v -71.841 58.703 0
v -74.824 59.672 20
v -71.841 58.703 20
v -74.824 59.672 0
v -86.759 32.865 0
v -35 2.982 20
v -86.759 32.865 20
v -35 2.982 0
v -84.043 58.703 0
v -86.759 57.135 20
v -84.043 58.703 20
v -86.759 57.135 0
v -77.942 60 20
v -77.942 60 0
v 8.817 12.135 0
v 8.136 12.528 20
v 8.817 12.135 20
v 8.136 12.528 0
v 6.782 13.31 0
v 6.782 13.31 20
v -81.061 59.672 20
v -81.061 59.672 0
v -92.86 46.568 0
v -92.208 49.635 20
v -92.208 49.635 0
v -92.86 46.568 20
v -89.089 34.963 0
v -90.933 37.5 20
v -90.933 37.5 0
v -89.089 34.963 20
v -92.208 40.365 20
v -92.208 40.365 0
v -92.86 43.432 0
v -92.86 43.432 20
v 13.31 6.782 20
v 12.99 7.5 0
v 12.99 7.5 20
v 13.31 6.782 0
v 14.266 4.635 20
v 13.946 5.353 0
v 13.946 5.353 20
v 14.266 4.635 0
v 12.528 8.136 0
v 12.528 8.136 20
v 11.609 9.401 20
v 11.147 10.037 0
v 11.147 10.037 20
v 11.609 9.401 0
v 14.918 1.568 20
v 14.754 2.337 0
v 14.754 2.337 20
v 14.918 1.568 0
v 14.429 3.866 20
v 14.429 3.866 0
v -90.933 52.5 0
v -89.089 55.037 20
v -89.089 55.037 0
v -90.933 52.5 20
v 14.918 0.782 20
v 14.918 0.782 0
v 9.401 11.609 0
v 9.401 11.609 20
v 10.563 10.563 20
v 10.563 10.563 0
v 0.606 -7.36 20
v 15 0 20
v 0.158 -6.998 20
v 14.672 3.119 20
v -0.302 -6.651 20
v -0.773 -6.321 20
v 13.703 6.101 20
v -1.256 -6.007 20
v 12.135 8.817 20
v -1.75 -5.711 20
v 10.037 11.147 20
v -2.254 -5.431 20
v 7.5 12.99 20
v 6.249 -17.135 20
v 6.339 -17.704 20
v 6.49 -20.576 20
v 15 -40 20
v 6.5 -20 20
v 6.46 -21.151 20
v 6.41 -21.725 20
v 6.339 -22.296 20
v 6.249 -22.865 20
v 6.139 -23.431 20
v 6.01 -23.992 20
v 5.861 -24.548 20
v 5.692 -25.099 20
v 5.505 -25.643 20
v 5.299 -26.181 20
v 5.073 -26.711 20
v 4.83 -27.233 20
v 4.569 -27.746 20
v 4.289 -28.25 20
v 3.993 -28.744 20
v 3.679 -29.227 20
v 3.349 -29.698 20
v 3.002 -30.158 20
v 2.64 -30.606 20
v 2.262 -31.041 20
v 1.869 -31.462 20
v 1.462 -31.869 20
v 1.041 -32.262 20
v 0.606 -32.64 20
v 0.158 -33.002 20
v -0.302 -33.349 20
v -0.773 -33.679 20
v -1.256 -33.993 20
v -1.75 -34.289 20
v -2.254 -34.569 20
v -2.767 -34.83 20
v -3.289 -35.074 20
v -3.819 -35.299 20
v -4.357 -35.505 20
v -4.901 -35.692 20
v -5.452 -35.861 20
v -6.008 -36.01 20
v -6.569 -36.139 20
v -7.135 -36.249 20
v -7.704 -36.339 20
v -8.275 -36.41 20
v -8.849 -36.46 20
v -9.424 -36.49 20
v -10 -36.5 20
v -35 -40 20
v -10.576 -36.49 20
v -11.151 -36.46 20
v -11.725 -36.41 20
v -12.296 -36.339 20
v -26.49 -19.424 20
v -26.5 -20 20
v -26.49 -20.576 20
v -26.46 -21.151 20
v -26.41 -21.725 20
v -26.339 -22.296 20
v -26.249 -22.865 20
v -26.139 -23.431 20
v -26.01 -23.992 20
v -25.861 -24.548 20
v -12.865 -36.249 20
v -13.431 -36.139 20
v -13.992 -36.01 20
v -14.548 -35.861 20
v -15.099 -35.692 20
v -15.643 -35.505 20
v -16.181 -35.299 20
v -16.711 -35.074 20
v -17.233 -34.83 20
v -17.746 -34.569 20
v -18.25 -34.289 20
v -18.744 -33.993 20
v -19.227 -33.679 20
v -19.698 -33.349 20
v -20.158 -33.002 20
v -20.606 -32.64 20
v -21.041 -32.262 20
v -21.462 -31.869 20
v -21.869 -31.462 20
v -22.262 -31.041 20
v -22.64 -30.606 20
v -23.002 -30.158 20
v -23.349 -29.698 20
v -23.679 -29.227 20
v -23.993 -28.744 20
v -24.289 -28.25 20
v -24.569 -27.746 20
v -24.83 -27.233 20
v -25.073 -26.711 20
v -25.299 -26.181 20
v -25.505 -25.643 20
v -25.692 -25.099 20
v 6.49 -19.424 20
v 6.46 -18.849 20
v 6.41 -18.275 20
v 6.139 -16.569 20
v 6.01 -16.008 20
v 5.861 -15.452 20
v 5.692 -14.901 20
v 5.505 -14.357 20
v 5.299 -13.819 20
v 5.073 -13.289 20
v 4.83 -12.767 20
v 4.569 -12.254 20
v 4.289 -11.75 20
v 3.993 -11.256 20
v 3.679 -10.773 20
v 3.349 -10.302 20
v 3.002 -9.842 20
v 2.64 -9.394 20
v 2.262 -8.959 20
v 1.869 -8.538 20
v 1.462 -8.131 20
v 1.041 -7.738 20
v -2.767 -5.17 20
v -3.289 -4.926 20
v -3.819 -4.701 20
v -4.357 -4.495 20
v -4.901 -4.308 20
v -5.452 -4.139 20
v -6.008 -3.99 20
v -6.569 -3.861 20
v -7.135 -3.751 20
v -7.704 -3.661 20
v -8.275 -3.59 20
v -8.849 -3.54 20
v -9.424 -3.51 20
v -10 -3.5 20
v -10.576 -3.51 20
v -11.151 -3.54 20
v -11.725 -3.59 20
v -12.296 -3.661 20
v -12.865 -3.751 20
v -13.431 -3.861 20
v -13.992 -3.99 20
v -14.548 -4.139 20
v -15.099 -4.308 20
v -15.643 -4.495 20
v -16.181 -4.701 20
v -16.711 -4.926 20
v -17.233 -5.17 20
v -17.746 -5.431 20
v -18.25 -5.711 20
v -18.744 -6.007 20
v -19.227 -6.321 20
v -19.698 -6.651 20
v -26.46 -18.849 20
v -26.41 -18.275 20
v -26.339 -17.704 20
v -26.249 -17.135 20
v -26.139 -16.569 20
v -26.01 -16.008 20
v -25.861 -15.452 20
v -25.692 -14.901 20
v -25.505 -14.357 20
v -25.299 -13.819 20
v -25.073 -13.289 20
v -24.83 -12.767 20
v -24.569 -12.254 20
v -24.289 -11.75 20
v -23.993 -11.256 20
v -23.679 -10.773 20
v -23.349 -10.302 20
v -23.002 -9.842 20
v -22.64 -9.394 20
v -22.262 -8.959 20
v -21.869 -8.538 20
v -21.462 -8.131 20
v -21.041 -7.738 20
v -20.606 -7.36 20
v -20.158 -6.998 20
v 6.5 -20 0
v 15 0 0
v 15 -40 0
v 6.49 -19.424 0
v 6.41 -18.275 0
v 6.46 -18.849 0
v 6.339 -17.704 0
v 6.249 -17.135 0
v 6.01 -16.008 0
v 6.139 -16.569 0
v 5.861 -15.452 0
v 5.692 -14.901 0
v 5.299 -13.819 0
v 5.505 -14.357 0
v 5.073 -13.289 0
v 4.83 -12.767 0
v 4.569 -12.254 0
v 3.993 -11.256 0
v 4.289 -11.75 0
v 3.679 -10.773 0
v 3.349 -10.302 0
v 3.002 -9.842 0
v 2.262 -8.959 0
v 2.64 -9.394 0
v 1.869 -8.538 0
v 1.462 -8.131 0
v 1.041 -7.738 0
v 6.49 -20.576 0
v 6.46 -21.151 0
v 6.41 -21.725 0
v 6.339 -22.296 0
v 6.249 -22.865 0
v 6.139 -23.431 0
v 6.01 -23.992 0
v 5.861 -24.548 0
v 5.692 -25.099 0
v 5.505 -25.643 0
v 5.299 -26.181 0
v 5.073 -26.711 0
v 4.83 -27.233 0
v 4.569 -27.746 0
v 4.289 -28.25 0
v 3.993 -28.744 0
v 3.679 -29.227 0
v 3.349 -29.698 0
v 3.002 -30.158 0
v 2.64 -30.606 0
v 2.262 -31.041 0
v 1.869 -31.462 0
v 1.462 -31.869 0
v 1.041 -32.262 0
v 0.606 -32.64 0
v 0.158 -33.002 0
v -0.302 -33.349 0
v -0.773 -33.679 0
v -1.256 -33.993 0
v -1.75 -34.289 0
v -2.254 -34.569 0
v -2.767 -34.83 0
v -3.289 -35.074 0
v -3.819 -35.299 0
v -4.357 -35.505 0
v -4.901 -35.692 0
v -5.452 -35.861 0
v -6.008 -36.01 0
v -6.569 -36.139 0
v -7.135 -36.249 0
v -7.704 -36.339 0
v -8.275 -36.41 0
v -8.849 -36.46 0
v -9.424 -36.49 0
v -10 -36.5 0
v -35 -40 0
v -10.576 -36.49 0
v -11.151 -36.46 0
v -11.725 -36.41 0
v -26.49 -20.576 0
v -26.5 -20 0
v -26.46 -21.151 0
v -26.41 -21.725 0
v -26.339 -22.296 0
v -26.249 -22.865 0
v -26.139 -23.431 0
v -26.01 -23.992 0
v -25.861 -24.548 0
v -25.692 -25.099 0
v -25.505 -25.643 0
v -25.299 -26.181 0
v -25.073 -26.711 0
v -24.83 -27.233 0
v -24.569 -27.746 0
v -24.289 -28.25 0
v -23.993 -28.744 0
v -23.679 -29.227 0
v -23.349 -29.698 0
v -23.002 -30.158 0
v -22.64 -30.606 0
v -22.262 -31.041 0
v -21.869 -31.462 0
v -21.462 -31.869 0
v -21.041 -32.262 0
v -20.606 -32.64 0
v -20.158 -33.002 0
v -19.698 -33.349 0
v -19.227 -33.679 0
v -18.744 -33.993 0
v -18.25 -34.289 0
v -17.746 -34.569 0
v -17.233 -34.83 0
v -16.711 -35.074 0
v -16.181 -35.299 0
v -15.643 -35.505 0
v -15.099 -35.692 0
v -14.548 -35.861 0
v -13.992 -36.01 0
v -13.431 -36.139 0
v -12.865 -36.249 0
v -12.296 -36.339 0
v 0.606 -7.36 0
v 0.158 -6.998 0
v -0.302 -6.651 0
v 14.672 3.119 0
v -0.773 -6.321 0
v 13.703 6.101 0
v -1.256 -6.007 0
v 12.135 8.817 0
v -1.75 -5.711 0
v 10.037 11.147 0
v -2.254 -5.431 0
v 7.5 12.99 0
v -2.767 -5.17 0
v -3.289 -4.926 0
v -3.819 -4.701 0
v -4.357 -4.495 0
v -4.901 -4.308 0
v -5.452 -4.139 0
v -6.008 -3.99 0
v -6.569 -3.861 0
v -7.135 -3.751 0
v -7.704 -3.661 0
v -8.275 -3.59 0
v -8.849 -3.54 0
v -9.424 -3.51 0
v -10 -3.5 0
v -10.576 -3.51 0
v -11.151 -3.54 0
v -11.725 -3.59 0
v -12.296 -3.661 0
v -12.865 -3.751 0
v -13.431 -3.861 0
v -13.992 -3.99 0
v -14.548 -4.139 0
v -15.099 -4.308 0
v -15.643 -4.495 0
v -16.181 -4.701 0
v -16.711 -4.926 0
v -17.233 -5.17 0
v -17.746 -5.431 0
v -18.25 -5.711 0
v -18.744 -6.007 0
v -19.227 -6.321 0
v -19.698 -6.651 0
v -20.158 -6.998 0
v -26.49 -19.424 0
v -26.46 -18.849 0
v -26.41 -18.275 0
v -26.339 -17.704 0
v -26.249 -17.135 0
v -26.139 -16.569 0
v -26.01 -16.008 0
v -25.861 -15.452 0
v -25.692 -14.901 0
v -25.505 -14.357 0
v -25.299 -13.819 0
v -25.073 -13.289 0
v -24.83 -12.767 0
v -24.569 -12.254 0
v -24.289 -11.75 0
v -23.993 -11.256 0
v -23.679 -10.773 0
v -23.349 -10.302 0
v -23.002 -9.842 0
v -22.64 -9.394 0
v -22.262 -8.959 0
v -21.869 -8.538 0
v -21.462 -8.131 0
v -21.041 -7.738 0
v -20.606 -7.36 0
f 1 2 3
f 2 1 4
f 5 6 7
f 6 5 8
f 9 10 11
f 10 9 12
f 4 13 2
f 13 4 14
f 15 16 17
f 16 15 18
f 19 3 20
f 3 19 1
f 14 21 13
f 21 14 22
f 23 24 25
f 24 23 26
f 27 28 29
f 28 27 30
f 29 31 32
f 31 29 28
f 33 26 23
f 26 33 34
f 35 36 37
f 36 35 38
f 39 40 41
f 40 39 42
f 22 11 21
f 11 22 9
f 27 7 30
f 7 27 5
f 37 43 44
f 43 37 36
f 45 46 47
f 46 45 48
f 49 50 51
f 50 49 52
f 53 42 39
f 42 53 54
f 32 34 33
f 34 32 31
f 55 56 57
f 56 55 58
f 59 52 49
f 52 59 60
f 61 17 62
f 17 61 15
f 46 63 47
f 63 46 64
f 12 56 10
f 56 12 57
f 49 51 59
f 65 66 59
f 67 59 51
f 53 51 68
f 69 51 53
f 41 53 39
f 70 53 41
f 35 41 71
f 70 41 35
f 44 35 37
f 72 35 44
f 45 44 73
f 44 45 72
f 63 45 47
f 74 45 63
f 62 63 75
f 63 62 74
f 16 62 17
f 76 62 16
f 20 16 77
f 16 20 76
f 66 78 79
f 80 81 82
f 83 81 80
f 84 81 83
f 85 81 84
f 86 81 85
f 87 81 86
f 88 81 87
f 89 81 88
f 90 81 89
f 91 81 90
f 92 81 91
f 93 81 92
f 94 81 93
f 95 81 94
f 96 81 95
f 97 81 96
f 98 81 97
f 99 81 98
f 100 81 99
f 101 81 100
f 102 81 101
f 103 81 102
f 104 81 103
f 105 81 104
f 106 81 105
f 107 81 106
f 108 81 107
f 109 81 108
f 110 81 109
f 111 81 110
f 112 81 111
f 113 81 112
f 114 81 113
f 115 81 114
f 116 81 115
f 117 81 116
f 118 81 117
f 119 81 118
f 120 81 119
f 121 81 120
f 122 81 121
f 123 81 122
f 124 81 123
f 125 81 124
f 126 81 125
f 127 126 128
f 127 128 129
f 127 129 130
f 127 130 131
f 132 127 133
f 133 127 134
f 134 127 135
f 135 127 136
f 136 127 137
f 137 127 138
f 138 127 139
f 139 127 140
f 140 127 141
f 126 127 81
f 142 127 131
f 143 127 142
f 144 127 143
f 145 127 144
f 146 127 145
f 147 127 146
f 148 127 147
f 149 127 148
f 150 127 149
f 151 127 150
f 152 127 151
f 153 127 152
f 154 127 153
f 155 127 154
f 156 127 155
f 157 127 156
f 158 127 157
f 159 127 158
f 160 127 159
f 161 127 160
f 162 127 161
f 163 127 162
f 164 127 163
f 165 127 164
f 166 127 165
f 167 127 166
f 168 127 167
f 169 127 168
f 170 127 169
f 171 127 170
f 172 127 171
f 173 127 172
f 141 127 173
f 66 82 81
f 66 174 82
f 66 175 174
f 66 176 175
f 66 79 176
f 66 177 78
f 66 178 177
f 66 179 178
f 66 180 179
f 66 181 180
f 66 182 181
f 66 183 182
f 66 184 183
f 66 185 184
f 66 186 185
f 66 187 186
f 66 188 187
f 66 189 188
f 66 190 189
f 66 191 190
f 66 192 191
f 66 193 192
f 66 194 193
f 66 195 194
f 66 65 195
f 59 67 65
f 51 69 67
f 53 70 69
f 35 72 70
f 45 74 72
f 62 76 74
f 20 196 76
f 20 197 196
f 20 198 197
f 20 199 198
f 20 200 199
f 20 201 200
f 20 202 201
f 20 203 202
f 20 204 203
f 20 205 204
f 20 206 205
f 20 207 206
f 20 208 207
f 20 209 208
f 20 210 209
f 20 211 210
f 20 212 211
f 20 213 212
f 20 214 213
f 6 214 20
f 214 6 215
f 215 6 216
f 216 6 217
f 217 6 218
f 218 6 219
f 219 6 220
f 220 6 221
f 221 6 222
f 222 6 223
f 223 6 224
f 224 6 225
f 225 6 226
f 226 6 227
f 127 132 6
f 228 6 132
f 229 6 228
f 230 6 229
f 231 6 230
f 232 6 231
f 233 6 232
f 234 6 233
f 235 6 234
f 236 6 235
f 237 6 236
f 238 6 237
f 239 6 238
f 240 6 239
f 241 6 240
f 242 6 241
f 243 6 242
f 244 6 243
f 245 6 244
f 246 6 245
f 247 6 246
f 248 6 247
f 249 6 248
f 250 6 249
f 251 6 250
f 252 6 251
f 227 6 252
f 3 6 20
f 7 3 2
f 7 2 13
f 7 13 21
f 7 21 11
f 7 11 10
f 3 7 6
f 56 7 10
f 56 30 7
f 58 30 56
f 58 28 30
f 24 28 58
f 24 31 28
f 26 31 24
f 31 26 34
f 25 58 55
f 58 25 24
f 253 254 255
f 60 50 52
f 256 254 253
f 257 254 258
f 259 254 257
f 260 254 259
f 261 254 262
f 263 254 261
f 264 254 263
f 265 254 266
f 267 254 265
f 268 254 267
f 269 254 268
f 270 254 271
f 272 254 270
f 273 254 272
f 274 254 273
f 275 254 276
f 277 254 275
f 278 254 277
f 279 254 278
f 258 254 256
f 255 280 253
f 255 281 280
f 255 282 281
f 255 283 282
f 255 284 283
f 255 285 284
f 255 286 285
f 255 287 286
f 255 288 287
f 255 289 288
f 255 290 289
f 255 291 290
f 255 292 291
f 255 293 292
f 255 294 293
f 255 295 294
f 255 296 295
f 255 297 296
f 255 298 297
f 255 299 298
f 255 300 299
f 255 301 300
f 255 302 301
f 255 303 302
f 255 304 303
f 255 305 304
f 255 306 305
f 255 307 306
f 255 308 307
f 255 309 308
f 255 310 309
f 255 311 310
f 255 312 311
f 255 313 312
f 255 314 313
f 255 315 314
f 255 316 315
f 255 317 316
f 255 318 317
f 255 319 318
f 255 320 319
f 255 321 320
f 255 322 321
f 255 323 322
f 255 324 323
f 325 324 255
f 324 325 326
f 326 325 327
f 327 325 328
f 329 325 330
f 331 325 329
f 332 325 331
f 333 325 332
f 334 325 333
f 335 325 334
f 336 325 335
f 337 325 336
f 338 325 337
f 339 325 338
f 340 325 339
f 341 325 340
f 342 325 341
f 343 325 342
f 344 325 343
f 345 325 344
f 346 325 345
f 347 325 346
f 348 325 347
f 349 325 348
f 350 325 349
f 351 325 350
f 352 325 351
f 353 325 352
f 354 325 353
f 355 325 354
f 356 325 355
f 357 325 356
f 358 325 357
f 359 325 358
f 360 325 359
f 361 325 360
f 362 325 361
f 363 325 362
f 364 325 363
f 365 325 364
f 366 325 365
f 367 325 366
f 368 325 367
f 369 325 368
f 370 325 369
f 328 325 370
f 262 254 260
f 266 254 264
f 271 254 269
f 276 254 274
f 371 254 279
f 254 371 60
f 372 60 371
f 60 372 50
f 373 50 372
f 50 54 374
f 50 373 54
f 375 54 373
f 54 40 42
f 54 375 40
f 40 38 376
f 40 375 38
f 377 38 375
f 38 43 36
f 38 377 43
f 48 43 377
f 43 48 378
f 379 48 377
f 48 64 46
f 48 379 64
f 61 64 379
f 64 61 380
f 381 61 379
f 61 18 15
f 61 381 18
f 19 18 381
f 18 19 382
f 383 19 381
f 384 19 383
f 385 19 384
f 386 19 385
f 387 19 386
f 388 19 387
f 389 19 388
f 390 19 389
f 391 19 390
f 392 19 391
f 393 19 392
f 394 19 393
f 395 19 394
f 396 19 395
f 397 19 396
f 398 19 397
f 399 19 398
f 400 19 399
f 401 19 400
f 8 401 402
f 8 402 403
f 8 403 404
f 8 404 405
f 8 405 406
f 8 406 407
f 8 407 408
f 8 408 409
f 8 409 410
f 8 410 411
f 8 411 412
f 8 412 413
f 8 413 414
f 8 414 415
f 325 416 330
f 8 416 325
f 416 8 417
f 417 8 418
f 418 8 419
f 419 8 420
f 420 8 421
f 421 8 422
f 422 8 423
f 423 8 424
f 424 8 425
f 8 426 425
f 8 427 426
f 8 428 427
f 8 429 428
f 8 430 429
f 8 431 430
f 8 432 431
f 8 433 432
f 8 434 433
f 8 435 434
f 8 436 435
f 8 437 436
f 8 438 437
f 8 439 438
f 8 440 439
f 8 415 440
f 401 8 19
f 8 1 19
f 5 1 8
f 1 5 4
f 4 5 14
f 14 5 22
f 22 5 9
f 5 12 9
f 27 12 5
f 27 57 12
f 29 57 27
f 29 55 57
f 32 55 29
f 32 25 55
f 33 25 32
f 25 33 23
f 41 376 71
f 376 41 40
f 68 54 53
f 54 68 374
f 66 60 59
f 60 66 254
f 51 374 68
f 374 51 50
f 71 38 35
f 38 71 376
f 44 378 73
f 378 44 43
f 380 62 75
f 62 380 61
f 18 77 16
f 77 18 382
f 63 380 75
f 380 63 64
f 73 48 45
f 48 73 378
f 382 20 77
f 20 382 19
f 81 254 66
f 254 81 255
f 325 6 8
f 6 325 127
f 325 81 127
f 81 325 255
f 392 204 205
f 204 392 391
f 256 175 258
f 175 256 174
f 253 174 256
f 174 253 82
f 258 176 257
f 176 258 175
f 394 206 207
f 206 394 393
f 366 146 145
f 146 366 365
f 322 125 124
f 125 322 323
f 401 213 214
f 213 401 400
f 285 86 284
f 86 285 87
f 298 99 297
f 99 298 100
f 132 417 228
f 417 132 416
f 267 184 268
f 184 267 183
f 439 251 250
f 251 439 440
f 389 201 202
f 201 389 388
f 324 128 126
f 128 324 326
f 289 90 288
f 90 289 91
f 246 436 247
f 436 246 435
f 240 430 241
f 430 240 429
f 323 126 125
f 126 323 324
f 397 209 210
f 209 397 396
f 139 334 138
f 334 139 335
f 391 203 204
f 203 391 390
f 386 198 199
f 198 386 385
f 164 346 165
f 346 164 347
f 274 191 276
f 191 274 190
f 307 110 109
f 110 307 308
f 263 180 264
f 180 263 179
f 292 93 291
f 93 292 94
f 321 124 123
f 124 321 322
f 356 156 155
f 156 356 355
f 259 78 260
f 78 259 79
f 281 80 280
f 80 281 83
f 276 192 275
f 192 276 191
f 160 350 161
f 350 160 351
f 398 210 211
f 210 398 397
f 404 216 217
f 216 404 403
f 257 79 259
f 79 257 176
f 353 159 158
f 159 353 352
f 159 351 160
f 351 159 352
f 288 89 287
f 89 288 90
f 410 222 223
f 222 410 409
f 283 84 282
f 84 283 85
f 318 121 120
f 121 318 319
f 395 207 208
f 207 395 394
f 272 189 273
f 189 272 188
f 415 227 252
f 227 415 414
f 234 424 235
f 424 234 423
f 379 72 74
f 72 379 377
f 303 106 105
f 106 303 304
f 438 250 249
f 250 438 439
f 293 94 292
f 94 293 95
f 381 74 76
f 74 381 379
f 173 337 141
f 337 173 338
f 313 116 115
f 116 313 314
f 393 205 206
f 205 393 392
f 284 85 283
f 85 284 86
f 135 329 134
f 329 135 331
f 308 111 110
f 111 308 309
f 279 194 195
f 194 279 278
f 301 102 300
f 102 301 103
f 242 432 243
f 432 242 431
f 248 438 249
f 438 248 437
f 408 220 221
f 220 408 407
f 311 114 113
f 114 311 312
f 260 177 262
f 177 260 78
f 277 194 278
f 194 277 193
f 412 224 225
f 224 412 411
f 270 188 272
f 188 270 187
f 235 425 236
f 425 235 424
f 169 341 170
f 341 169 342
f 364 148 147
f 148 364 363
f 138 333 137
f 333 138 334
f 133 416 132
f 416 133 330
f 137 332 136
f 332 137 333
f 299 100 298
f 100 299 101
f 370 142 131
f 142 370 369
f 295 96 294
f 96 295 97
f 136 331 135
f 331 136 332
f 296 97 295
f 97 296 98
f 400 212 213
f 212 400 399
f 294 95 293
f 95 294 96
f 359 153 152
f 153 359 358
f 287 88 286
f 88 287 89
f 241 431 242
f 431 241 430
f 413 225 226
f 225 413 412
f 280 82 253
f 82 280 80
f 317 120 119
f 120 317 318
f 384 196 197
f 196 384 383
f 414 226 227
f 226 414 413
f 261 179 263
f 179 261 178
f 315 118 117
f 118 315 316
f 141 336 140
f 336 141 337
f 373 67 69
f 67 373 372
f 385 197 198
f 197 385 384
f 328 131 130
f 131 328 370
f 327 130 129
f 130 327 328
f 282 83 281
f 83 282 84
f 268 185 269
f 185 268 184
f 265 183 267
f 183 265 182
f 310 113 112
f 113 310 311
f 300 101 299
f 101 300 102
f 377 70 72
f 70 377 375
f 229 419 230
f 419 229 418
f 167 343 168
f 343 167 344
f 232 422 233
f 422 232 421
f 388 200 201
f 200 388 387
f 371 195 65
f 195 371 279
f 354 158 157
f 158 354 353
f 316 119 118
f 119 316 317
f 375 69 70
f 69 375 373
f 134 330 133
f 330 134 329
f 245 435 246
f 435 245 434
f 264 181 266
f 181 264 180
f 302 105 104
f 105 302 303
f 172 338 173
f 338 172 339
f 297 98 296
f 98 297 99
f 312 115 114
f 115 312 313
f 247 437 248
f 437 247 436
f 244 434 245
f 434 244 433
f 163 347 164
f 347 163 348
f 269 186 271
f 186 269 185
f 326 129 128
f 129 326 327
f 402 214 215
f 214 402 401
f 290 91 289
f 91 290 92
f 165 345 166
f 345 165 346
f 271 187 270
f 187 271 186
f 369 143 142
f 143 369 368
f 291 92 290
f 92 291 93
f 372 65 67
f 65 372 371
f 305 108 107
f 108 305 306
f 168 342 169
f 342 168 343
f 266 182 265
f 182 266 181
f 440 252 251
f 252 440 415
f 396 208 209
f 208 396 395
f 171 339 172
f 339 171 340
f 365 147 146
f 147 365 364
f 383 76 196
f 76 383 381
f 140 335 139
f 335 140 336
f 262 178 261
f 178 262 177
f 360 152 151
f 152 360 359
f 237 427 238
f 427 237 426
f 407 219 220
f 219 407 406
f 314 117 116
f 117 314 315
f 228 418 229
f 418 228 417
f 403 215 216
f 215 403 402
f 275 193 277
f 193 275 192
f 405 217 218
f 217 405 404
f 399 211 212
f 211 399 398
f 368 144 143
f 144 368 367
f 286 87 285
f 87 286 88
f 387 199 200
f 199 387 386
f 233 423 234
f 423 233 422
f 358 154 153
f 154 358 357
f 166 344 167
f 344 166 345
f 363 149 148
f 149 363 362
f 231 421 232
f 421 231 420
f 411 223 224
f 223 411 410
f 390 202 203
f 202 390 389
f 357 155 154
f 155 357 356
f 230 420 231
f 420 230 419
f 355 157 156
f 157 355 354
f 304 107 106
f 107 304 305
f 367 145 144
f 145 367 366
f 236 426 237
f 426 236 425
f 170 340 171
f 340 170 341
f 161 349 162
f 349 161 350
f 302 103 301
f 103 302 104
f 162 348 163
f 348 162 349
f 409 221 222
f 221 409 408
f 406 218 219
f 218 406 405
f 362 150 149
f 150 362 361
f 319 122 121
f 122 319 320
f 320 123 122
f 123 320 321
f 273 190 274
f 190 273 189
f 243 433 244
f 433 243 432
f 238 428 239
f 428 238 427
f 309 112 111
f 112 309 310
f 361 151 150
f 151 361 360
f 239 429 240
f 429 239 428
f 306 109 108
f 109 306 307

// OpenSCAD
r_mount=(28.8+2*2.1)/2;
h=20;
eps=0.01;

module mount_rod_space()
{
  translate([0, 0, -eps])
    cylinder(r=r_mount, h=h+2*eps, $fn=180);
}


module body_core()
{
  // holes rod
  rotate([0, 0, 180-30])
    hull()
      for(dx=[0, 90])
        translate([dx, 0, 0])
          cylinder(r=30/2, h=h);
  // rod_slot
  cylinder(r=30/2, h=h);
  translate([-35, -40, 0])
    cube([50, 40, h]);
  // stubbing hole, between two elements
  translate([-35, 0, 0])
    cube([20, 10, h]);
}


module buggy_troley_mount()
{
  difference()
  {
    body_core();
    translate([-20/2, -20, 0])
      mount_rod_space();
  }
}


buggy_troley_mount();
